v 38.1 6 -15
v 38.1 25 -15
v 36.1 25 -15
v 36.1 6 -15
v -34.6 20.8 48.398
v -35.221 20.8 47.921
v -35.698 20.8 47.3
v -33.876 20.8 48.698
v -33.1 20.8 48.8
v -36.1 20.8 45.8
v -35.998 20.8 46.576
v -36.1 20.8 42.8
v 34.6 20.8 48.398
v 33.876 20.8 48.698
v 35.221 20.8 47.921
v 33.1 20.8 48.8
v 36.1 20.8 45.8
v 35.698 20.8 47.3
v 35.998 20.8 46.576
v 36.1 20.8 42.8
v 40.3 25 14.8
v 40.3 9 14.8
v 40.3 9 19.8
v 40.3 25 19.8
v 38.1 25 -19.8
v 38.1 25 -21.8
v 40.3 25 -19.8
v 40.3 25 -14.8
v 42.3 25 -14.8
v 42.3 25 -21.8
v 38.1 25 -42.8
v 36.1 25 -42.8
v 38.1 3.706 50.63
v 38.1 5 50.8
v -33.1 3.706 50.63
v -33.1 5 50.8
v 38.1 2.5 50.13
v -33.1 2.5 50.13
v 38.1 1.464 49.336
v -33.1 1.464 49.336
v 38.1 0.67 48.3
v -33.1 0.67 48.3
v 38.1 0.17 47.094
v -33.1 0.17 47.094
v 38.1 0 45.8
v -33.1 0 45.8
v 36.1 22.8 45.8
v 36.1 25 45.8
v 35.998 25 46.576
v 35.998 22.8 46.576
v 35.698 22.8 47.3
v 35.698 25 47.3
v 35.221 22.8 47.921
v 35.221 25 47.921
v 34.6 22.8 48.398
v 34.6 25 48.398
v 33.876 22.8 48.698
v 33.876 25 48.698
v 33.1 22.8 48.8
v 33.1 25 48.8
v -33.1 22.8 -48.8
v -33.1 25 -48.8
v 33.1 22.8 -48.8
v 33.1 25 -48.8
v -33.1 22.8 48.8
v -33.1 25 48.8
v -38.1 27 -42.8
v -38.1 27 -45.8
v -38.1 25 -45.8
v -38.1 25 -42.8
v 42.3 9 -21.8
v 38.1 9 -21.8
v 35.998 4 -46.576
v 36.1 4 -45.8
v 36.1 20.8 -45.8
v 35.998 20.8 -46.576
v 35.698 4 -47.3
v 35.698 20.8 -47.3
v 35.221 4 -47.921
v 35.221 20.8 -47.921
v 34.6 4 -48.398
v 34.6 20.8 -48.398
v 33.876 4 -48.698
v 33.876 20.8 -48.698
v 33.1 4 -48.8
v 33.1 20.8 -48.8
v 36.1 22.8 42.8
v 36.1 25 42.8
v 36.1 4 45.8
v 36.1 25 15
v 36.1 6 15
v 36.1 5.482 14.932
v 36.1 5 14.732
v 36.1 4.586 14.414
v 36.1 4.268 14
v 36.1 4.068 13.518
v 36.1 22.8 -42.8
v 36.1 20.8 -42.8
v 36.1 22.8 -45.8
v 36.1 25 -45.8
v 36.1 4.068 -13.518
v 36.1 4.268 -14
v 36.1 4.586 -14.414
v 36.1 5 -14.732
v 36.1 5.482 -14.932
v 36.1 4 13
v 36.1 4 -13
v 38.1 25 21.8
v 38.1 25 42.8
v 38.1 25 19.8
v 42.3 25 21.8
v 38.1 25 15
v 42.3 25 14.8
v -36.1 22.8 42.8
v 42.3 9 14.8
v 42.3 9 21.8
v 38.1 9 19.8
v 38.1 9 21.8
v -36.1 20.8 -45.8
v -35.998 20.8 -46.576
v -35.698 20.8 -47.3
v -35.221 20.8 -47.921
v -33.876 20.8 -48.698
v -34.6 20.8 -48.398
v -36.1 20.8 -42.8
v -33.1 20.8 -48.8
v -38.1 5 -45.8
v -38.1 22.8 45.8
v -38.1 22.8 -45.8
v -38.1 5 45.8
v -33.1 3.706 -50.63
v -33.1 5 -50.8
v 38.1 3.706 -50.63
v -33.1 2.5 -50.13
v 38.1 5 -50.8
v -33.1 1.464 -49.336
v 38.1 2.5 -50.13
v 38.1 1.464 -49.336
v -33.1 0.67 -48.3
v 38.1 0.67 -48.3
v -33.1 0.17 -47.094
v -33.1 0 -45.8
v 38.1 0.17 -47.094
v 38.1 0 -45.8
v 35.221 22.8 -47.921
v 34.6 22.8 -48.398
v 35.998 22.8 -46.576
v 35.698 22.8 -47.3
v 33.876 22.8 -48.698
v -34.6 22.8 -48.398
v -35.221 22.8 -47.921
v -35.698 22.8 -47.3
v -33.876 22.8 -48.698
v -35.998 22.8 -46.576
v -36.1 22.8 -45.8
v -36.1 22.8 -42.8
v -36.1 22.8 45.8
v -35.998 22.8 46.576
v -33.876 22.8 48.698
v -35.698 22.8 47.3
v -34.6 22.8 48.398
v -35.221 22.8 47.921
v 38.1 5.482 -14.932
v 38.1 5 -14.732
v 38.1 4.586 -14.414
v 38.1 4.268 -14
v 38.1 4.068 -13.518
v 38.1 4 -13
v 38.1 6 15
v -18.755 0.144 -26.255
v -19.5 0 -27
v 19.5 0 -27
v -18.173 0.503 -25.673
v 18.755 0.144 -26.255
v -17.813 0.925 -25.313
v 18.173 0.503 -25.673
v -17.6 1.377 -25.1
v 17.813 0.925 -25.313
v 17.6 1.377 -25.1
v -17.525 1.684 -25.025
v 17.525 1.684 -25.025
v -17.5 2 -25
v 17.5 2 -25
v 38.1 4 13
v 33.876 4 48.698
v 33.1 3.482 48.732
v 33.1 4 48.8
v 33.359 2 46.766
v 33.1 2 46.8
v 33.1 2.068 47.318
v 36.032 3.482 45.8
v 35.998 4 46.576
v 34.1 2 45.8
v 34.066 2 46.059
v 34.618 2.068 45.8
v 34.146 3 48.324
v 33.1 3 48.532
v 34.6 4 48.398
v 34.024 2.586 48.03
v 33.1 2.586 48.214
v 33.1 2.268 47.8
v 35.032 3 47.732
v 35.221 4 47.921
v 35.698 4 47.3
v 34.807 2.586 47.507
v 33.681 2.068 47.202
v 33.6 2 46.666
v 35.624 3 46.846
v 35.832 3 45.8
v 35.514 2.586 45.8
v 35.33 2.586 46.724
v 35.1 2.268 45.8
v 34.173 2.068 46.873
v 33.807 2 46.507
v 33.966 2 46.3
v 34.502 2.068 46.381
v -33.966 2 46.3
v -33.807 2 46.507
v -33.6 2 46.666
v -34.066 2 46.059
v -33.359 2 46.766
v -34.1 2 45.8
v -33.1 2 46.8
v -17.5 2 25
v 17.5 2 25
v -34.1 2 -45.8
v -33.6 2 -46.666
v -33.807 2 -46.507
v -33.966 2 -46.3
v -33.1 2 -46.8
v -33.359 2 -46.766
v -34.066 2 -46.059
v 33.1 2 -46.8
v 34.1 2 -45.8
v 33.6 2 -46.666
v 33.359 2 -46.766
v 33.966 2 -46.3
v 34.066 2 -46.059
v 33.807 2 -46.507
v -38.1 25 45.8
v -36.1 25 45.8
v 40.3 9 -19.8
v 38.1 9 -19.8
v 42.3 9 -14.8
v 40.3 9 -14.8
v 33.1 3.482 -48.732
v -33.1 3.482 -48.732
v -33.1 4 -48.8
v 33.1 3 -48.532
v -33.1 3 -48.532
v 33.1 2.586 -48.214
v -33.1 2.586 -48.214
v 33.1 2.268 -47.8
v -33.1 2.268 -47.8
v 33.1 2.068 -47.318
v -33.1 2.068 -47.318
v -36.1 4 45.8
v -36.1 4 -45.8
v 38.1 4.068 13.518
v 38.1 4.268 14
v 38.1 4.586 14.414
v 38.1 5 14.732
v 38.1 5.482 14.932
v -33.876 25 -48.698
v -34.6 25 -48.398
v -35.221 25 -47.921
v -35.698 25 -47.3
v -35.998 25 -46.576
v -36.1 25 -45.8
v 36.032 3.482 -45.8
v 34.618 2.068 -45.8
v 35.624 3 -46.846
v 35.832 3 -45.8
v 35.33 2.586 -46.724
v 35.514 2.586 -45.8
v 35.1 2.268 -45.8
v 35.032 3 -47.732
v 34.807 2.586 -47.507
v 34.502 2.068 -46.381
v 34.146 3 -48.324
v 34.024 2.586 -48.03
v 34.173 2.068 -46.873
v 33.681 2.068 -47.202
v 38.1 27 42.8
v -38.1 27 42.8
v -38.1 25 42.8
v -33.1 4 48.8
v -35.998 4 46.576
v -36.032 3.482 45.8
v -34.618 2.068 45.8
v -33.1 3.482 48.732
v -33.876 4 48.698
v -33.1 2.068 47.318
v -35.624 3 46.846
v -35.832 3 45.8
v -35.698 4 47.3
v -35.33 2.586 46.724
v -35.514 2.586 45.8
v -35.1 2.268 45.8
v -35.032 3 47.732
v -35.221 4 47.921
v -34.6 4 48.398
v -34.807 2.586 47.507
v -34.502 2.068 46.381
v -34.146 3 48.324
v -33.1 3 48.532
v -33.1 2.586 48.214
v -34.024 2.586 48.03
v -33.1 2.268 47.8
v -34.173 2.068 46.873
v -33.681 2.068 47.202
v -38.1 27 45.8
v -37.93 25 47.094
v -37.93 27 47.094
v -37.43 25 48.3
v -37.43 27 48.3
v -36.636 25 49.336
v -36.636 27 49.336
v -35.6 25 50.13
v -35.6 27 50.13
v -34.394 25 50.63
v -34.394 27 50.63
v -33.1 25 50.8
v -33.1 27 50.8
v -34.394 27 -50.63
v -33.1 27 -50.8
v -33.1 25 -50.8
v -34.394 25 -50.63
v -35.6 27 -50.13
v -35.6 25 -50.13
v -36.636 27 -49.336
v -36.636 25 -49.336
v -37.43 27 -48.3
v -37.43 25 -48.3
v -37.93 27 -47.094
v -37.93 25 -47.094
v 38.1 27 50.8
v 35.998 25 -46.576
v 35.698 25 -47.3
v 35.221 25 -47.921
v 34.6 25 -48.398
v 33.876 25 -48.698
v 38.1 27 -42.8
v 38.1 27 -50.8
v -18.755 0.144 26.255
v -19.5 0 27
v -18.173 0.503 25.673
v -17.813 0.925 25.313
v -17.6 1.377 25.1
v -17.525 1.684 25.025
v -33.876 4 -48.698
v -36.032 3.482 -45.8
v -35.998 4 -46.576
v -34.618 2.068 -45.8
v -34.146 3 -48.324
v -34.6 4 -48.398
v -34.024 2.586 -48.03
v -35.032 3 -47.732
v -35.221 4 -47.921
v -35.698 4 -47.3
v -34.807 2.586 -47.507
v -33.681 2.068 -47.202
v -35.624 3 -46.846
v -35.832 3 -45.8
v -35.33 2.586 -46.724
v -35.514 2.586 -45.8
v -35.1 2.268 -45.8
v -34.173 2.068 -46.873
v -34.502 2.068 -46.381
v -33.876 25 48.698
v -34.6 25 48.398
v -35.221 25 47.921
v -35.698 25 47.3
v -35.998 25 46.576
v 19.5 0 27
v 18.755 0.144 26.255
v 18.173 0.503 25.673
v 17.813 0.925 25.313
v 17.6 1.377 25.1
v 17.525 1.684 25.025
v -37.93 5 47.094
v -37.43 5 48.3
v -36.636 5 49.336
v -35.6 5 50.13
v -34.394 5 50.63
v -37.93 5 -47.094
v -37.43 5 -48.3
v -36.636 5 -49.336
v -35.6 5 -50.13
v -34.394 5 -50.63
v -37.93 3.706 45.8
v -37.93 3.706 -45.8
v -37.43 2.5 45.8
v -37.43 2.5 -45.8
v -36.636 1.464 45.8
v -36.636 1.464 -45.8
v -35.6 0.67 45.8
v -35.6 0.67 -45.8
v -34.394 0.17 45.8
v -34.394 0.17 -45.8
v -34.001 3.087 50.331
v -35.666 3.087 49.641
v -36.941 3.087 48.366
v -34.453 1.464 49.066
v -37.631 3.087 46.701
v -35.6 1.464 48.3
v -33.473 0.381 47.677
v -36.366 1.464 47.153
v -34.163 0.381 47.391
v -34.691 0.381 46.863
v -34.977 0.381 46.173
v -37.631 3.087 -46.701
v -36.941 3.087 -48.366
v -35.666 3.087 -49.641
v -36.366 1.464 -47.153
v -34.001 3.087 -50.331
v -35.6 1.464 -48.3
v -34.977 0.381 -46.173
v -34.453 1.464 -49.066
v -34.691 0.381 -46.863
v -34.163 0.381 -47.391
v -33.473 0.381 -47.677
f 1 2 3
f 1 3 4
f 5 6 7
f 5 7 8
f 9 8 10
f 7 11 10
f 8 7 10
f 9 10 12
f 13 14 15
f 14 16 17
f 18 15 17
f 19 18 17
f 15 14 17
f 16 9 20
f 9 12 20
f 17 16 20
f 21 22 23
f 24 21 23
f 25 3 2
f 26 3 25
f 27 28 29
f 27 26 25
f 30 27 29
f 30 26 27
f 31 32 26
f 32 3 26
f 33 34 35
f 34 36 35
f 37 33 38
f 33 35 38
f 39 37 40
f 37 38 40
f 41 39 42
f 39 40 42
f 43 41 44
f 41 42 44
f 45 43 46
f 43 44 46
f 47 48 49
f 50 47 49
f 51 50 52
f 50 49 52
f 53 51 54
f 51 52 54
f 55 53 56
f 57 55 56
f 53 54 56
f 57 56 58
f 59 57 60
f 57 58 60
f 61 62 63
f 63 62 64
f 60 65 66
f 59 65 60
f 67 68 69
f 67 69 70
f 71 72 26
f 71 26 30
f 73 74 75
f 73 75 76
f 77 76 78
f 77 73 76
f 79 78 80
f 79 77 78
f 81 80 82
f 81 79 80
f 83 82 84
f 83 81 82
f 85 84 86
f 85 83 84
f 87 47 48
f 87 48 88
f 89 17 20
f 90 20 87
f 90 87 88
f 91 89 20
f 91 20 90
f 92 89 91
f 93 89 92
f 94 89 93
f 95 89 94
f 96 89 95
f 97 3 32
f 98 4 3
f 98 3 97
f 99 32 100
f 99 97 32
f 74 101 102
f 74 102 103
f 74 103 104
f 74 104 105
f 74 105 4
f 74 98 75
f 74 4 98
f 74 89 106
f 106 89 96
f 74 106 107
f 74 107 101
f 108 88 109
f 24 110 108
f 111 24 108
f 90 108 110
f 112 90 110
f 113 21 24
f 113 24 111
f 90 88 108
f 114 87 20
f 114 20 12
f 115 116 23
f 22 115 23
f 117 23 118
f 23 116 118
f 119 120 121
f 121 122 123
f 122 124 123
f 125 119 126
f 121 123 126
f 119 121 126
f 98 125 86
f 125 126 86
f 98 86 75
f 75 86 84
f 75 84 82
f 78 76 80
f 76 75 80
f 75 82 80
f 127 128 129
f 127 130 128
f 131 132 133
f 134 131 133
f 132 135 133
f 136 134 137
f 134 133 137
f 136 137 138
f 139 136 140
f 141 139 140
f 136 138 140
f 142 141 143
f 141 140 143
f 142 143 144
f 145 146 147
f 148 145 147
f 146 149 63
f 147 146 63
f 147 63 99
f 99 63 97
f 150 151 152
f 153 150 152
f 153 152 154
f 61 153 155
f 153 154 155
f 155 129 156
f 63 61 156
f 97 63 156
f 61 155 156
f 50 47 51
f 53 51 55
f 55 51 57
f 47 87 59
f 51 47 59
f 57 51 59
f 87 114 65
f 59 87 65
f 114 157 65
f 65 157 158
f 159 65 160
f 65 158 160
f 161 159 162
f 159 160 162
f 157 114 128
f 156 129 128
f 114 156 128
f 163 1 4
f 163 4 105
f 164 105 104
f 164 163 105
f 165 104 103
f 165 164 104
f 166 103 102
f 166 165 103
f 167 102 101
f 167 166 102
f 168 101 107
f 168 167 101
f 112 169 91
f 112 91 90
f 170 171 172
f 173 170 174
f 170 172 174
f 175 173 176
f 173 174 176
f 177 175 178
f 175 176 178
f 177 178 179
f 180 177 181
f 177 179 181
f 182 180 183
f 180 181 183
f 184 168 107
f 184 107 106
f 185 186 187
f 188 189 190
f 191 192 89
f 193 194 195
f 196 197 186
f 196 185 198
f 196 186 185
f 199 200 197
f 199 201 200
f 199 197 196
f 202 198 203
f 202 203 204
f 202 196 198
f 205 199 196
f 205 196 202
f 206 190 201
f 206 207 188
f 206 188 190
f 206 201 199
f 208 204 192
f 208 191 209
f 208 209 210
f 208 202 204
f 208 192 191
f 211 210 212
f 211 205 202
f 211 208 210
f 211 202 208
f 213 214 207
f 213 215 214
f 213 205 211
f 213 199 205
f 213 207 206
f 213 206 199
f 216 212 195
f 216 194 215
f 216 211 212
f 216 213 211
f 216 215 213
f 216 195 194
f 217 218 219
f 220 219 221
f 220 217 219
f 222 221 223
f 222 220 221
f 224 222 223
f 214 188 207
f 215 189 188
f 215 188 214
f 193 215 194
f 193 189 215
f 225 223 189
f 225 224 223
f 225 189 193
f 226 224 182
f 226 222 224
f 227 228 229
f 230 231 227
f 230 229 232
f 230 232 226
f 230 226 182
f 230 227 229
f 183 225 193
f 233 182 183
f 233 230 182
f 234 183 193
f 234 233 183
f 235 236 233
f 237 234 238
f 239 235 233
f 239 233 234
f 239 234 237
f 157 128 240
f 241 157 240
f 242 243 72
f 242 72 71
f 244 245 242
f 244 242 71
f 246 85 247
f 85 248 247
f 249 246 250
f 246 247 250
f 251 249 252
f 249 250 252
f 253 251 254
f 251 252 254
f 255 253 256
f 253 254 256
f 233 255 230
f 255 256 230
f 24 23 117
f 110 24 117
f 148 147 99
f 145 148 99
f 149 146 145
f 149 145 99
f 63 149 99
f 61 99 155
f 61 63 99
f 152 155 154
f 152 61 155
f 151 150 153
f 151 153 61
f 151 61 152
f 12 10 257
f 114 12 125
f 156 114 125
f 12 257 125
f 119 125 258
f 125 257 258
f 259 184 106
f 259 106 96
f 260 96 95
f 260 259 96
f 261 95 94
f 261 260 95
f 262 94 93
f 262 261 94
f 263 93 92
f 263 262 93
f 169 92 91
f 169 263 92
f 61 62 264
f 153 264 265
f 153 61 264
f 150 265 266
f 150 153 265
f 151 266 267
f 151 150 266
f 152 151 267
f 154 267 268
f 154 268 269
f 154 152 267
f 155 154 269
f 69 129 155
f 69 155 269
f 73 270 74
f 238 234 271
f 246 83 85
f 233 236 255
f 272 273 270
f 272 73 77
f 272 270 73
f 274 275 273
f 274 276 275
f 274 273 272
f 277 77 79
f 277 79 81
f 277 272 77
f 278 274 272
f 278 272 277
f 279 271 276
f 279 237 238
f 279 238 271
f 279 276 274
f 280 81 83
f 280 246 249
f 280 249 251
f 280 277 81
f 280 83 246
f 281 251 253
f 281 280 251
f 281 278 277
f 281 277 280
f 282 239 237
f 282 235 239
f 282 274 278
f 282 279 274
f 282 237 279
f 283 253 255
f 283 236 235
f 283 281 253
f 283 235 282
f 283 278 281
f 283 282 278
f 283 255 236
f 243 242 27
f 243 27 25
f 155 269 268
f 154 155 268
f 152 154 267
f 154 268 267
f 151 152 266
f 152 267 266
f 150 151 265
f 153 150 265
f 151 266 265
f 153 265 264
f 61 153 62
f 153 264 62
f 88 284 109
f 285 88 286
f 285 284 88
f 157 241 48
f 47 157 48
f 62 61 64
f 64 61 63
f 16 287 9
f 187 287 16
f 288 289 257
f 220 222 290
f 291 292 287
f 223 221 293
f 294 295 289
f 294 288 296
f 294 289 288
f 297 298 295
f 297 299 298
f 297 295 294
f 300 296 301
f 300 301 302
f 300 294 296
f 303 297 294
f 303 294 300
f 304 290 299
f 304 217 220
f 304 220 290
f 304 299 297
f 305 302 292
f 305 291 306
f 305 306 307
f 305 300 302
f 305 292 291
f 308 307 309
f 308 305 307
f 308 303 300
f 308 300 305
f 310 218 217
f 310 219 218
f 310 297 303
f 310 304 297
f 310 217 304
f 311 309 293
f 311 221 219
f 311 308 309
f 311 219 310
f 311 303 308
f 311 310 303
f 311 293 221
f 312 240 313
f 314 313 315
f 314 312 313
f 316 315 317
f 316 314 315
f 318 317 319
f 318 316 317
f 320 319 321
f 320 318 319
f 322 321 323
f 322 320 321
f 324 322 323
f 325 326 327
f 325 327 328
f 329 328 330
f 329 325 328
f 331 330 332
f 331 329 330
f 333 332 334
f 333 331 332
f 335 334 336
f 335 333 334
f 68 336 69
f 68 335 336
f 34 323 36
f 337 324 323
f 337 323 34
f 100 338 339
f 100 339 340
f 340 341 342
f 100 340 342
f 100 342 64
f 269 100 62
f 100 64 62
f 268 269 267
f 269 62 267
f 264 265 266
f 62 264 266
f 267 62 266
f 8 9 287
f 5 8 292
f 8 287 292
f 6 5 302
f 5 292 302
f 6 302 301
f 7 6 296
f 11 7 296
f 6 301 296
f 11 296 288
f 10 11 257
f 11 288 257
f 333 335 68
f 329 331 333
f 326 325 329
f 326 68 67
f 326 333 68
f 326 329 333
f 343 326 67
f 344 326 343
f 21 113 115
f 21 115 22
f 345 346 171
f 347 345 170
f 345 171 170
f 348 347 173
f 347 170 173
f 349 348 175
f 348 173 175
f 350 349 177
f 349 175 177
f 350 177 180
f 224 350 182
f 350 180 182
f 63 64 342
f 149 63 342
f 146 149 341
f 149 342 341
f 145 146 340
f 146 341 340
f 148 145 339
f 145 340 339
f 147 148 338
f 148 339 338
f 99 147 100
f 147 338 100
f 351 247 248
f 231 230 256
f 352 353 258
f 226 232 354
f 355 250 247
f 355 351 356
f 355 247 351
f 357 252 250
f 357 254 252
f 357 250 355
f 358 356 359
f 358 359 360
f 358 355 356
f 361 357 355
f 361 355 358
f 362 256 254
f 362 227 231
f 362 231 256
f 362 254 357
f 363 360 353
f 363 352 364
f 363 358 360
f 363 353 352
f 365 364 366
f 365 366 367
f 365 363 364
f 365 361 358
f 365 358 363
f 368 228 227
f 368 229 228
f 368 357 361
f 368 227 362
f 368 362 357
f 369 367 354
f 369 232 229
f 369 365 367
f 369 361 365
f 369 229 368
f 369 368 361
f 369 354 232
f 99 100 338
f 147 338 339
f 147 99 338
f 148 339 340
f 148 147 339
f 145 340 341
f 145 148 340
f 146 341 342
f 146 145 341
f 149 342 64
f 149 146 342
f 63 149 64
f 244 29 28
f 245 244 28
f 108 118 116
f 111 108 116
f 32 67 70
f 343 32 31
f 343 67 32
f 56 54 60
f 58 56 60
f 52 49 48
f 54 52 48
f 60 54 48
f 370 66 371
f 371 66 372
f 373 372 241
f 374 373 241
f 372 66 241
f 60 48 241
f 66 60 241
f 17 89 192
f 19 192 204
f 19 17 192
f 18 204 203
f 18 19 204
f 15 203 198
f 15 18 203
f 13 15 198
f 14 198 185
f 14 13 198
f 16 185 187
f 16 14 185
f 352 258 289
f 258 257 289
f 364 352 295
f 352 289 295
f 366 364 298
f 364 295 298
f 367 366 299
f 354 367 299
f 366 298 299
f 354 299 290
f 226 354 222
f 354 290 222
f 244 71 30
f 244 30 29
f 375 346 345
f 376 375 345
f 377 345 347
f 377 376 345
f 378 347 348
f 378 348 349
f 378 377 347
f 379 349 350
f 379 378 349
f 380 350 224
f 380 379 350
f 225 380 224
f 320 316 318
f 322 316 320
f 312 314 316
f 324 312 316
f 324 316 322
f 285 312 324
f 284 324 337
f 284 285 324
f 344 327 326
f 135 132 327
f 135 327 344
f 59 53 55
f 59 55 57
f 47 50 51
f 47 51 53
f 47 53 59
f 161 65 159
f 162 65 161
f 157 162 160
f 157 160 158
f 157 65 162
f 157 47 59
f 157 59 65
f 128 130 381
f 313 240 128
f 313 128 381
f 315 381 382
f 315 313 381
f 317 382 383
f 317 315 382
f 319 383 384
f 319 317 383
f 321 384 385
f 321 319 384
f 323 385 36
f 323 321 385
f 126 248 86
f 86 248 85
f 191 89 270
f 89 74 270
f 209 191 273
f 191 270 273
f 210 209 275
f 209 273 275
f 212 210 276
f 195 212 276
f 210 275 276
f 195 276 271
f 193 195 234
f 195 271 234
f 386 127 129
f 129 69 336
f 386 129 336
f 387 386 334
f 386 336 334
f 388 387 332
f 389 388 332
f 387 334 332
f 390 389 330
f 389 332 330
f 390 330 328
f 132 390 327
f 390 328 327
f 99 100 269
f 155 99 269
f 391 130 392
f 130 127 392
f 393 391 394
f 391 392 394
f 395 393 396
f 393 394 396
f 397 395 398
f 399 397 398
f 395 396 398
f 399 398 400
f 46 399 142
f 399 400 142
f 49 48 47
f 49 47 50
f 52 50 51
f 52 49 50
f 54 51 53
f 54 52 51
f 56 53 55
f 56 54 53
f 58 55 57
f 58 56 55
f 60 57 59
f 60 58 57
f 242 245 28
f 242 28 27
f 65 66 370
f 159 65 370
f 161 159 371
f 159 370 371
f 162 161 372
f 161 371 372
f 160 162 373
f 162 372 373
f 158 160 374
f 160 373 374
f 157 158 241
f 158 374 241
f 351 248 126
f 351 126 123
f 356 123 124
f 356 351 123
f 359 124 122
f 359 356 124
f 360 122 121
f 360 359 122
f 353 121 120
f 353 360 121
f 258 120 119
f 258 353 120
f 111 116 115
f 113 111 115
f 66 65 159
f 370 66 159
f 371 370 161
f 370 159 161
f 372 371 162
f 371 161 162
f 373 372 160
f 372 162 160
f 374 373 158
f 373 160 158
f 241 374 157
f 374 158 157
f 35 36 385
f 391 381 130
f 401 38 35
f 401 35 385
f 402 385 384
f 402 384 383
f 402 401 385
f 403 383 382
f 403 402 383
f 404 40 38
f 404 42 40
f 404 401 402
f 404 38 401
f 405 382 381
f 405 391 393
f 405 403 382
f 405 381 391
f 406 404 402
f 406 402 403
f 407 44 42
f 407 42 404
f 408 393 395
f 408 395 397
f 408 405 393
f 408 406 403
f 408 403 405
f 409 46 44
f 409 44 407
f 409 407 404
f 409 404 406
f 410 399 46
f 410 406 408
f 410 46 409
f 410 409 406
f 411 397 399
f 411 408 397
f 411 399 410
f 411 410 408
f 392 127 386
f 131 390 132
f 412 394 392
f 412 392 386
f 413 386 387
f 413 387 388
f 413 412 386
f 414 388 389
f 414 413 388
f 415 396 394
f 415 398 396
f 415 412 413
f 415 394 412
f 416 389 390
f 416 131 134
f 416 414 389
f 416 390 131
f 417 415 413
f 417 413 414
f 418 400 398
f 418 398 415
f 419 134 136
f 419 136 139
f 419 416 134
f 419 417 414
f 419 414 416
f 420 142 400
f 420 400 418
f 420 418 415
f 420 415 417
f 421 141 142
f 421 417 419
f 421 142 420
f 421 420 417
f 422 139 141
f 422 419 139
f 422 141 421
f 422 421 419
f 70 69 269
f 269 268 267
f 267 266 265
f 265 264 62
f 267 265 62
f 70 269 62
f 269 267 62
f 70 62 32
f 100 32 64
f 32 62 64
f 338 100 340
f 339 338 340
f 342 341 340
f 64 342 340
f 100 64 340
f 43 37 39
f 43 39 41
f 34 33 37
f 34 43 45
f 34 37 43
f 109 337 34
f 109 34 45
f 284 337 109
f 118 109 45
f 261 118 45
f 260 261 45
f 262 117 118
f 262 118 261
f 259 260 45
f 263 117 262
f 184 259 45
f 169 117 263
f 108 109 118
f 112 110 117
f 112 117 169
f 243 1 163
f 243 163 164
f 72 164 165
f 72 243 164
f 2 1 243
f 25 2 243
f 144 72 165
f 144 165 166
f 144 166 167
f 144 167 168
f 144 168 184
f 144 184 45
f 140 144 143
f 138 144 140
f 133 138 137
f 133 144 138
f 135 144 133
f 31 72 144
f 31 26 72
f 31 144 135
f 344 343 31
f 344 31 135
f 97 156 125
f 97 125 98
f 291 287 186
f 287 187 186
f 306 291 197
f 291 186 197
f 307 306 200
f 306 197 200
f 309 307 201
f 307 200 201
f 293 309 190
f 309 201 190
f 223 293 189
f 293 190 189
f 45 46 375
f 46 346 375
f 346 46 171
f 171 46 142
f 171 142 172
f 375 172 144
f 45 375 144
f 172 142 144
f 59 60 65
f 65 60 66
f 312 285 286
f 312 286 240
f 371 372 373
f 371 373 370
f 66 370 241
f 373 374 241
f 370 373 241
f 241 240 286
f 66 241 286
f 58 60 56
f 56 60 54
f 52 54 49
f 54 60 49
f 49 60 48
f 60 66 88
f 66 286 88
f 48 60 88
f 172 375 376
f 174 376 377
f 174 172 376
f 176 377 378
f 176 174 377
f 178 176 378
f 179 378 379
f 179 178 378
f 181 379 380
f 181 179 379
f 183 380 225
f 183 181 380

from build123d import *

# Parameters (mm, degrees)
SKETCH1_W             = 76.2
SKETCH1_H             = 101.6
BOSS_EXTRUDE1_DEPTH   = 25
SHELL1_T              = -2
SKETCH2_W             = 35
SKETCH2_H             = 50
CUT_EXTRUDE1_DEPTH    = 25
CUT_EXTRUDE2_REACH    = 96.932
FILLET1_R             = 5
FILLET2_R             = 3
FILLET3_R             = 2
FILLET4_R             = 5
BOSS_EXTRUDE4_DEPTH   = 2.2
BOSS_EXTRUDE4_2_DEPTH = 2.2
SKETCH4_W             = 91.6
SKETCH4_H             = 4.4
CUT_EXTRUDE3_DEPTH    = 2
BOSS_EXTRUDE2_START   = 2
BOSS_EXTRUDE2_DEPTH   = 2
LPATTERN1_COUNT       = 2
LPATTERN1_PITCH       = 4.2
BOSS_EXTRUDE3_START   = -9
BOSS_EXTRUDE3_DEPTH   = 16
FILLET5_R             = 2


with BuildPart() as part:
    # Sketch1 → Boss-Extrude1 (new body)
    with BuildSketch(Plane(origin=(0, 0, 0), x_dir=(1, 0, 0), z_dir=(0, 1, 0))):
        Rectangle(SKETCH1_W, SKETCH1_H)
    extrude(amount=BOSS_EXTRUDE1_DEPTH)

    # Shell1
    shell1_openings = [part.faces().sort_by_distance(p)[0] for p in [
        (0, 25, 0),
    ]]
    offset(amount=SHELL1_T, openings=shell1_openings, kind=Kind.INTERSECTION)

    # Sketch2 → Cut-Extrude1 (cut)
    with BuildSketch(Plane(origin=(0, 2, 0), x_dir=(1, 0, 0), z_dir=(0, 1, 0))):
        Rectangle(SKETCH2_W, SKETCH2_H)
    extrude(amount=-CUT_EXTRUDE1_DEPTH, mode=Mode.SUBTRACT)

    # Sketch3 → Cut-Extrude2 (cut, up to next)
    with BuildSketch(Plane(origin=(38.1, 0, 0), x_dir=(0, 0, -1), z_dir=(1, 0, 0)), mode=Mode.PRIVATE) as cut_extrude2_sk1:
        with BuildLine():
            Line((-15, 46), (15, 46))
            Line((15, 46), (15, 6))
            ThreePointArc((15, 6), (14.414213562, 4.585786438), (13, 4))
            Line((13, 4), (-13, 4))
            ThreePointArc((-13, 4), (-14.414213562, 4.585786438), (-15, 6))
            Line((-15, 6), (-15, 46))
        make_face()
    cut_extrude2_tool1 = extrude(cut_extrude2_sk1.sketch, amount=-CUT_EXTRUDE2_REACH, mode=Mode.PRIVATE) & part.part
    add(cut_extrude2_tool1.solids().sort_by_distance((38.1, 25.028043, 0))[0], mode=Mode.SUBTRACT)

    # Fillet1
    fillet1_edges = [part.edges().sort_by_distance(p)[0] for p in [
        (-38.1, 12.5, -50.8),
        (-38.1, 12.5, 50.8),
    ]]
    fillet(fillet1_edges, radius=FILLET1_R)

    # Fillet2
    fillet2_edges = [part.edges().sort_by_distance(p)[0] for p in [
        (-36.1, 13.5, -48.8),
        (-36.1, 13.5, 48.8),
        (36.1, 13.5, 48.8),
        (36.1, 13.5, -48.8),
    ]]
    fillet(fillet2_edges, radius=FILLET2_R)

    # Fillet3
    fillet3_edges = [part.edges().sort_by_distance(p)[0] for p in [
        (36.1, 2, 0),
        (-36.1, 2, 0),
        (0, 2, 48.8),
        (0, 2, -48.8),
        (-35.221320344, 2, -47.921320344),
        (-35.221320344, 2, 47.921320344),
        (35.221320344, 2, 47.921320344),
        (35.221320344, 2, -47.921320344),
    ]]
    fillet(fillet3_edges, radius=FILLET3_R - 0.0001)  # a hair under: the kernel refuses the full size

    # Fillet4
    fillet4_edges = [part.edges().sort_by_distance(p)[0] for p in [
        (2.5, 0, -50.8),
        (2.5, 0, 50.8),
        (-38.1, 0, 0),
        (-36.635533906, 0, -49.335533906),
        (-36.635533906, 0, 49.335533906),
    ]]
    fillet(fillet4_edges, radius=FILLET4_R)

    # Sketch4 → Cut-Extrude3 (cut)
    with BuildSketch(Plane.ZY.offset(38.1)):
        with Locations((0, 25)):
            Rectangle(SKETCH4_W, SKETCH4_H)
    extrude(amount=-CUT_EXTRUDE3_DEPTH, mode=Mode.SUBTRACT)

    # Sketch5 → Boss-Extrude2 (add)
    with BuildSketch(Plane(origin=(0, 25, 0), x_dir=(1, 0, 0), z_dir=(0, 1, 0)).offset(BOSS_EXTRUDE2_START)):
        with BuildLine():
            Line((-33.1, -50.8), (38.1, -50.8))
            Line((38.1, -50.8), (38.1, -42.8))
            Line((38.1, -42.8), (-38.1, -42.8))
            Line((-38.1, -42.8), (-38.1, -45.8))
            ThreePointArc((-38.1, -45.8), (-36.635533906, -49.335533906), (-33.1, -50.8))
        make_face()
        with BuildLine():
            Line((38.1, 50.8), (-33.1, 50.8))
            ThreePointArc((-33.1, 50.8), (-36.635533906, 49.335533906), (-38.1, 45.8))
            Line((-38.1, 45.8), (-38.1, 42.8))
            Line((-38.1, 42.8), (38.1, 42.8))
            Line((38.1, 42.8), (38.1, 50.8))
        make_face()
    boss_extrude2 = extrude(amount=-BOSS_EXTRUDE2_DEPTH)

    # LPattern1: Boss-Extrude2 ×2
    with Locations(*[(0, -i * LPATTERN1_PITCH, 0) for i in range(1, LPATTERN1_COUNT)]):
        add(boss_extrude2)

    # Sketch6 → Boss-Extrude3 (add)
    with BuildSketch(Plane.XZ.offset(BOSS_EXTRUDE3_START)):
        Polygon((38.1, -19.8), (38.1, -21.8), (42.3, -21.8), (42.3, -14.8), (40.3, -14.8), (40.3, -19.8), align=None)
        Polygon((40.3, 19.8), (38.1, 19.8), (38.1, 21.8), (42.3, 21.8), (42.3, 14.8), (40.3, 14.8), align=None)
    extrude(amount=-BOSS_EXTRUDE3_DEPTH)

    # Fillet5
    fillet5_edges = [part.edges().sort_by_distance(p)[0] for p in [
        (17.5, 0, 0),
        (0, 0, 25),
        (-17.5, 0, 0),
        (0, 0, -25),
    ]]
    fillet(fillet5_edges, radius=FILLET5_R - 0.0001)  # a hair under: the kernel refuses the full size


with BuildPart() as body_2:
    # Sketch7 → Boss-Extrude4 (new body)
    with BuildSketch(Plane(origin=(0, 25, 0), x_dir=(1, 0, 0), z_dir=(0, 1, 0))):
        with BuildLine():
            Line((-36.1, -45.8), (36.1, -45.8))
            ThreePointArc((36.1, -45.8), (35.221320344, -47.921320344), (33.1, -48.8))
            Line((33.1, -48.8), (-33.1, -48.8))
            ThreePointArc((-33.1, -48.8), (-35.221320344, -47.921320344), (-36.1, -45.8))
        make_face()
    extrude(amount=-BOSS_EXTRUDE4_DEPTH)


with BuildPart() as body_3:
    # Sketch7 → Boss-Extrude4 2 (new body)
    with BuildSketch(Plane(origin=(0, 25, 0), x_dir=(1, 0, 0), z_dir=(0, 1, 0))):
        with BuildLine():
            Line((-33.1, 48.8), (33.1, 48.8))
            ThreePointArc((33.1, 48.8), (35.221320344, 47.921320344), (36.1, 45.8))
            Line((36.1, 45.8), (-36.1, 45.8))
            ThreePointArc((-36.1, 45.8), (-35.221320344, 47.921320344), (-33.1, 48.8))
        make_face()
    extrude(amount=-BOSS_EXTRUDE4_2_DEPTH)


solid = Compound([part.part, body_2.part, body_3.part])
